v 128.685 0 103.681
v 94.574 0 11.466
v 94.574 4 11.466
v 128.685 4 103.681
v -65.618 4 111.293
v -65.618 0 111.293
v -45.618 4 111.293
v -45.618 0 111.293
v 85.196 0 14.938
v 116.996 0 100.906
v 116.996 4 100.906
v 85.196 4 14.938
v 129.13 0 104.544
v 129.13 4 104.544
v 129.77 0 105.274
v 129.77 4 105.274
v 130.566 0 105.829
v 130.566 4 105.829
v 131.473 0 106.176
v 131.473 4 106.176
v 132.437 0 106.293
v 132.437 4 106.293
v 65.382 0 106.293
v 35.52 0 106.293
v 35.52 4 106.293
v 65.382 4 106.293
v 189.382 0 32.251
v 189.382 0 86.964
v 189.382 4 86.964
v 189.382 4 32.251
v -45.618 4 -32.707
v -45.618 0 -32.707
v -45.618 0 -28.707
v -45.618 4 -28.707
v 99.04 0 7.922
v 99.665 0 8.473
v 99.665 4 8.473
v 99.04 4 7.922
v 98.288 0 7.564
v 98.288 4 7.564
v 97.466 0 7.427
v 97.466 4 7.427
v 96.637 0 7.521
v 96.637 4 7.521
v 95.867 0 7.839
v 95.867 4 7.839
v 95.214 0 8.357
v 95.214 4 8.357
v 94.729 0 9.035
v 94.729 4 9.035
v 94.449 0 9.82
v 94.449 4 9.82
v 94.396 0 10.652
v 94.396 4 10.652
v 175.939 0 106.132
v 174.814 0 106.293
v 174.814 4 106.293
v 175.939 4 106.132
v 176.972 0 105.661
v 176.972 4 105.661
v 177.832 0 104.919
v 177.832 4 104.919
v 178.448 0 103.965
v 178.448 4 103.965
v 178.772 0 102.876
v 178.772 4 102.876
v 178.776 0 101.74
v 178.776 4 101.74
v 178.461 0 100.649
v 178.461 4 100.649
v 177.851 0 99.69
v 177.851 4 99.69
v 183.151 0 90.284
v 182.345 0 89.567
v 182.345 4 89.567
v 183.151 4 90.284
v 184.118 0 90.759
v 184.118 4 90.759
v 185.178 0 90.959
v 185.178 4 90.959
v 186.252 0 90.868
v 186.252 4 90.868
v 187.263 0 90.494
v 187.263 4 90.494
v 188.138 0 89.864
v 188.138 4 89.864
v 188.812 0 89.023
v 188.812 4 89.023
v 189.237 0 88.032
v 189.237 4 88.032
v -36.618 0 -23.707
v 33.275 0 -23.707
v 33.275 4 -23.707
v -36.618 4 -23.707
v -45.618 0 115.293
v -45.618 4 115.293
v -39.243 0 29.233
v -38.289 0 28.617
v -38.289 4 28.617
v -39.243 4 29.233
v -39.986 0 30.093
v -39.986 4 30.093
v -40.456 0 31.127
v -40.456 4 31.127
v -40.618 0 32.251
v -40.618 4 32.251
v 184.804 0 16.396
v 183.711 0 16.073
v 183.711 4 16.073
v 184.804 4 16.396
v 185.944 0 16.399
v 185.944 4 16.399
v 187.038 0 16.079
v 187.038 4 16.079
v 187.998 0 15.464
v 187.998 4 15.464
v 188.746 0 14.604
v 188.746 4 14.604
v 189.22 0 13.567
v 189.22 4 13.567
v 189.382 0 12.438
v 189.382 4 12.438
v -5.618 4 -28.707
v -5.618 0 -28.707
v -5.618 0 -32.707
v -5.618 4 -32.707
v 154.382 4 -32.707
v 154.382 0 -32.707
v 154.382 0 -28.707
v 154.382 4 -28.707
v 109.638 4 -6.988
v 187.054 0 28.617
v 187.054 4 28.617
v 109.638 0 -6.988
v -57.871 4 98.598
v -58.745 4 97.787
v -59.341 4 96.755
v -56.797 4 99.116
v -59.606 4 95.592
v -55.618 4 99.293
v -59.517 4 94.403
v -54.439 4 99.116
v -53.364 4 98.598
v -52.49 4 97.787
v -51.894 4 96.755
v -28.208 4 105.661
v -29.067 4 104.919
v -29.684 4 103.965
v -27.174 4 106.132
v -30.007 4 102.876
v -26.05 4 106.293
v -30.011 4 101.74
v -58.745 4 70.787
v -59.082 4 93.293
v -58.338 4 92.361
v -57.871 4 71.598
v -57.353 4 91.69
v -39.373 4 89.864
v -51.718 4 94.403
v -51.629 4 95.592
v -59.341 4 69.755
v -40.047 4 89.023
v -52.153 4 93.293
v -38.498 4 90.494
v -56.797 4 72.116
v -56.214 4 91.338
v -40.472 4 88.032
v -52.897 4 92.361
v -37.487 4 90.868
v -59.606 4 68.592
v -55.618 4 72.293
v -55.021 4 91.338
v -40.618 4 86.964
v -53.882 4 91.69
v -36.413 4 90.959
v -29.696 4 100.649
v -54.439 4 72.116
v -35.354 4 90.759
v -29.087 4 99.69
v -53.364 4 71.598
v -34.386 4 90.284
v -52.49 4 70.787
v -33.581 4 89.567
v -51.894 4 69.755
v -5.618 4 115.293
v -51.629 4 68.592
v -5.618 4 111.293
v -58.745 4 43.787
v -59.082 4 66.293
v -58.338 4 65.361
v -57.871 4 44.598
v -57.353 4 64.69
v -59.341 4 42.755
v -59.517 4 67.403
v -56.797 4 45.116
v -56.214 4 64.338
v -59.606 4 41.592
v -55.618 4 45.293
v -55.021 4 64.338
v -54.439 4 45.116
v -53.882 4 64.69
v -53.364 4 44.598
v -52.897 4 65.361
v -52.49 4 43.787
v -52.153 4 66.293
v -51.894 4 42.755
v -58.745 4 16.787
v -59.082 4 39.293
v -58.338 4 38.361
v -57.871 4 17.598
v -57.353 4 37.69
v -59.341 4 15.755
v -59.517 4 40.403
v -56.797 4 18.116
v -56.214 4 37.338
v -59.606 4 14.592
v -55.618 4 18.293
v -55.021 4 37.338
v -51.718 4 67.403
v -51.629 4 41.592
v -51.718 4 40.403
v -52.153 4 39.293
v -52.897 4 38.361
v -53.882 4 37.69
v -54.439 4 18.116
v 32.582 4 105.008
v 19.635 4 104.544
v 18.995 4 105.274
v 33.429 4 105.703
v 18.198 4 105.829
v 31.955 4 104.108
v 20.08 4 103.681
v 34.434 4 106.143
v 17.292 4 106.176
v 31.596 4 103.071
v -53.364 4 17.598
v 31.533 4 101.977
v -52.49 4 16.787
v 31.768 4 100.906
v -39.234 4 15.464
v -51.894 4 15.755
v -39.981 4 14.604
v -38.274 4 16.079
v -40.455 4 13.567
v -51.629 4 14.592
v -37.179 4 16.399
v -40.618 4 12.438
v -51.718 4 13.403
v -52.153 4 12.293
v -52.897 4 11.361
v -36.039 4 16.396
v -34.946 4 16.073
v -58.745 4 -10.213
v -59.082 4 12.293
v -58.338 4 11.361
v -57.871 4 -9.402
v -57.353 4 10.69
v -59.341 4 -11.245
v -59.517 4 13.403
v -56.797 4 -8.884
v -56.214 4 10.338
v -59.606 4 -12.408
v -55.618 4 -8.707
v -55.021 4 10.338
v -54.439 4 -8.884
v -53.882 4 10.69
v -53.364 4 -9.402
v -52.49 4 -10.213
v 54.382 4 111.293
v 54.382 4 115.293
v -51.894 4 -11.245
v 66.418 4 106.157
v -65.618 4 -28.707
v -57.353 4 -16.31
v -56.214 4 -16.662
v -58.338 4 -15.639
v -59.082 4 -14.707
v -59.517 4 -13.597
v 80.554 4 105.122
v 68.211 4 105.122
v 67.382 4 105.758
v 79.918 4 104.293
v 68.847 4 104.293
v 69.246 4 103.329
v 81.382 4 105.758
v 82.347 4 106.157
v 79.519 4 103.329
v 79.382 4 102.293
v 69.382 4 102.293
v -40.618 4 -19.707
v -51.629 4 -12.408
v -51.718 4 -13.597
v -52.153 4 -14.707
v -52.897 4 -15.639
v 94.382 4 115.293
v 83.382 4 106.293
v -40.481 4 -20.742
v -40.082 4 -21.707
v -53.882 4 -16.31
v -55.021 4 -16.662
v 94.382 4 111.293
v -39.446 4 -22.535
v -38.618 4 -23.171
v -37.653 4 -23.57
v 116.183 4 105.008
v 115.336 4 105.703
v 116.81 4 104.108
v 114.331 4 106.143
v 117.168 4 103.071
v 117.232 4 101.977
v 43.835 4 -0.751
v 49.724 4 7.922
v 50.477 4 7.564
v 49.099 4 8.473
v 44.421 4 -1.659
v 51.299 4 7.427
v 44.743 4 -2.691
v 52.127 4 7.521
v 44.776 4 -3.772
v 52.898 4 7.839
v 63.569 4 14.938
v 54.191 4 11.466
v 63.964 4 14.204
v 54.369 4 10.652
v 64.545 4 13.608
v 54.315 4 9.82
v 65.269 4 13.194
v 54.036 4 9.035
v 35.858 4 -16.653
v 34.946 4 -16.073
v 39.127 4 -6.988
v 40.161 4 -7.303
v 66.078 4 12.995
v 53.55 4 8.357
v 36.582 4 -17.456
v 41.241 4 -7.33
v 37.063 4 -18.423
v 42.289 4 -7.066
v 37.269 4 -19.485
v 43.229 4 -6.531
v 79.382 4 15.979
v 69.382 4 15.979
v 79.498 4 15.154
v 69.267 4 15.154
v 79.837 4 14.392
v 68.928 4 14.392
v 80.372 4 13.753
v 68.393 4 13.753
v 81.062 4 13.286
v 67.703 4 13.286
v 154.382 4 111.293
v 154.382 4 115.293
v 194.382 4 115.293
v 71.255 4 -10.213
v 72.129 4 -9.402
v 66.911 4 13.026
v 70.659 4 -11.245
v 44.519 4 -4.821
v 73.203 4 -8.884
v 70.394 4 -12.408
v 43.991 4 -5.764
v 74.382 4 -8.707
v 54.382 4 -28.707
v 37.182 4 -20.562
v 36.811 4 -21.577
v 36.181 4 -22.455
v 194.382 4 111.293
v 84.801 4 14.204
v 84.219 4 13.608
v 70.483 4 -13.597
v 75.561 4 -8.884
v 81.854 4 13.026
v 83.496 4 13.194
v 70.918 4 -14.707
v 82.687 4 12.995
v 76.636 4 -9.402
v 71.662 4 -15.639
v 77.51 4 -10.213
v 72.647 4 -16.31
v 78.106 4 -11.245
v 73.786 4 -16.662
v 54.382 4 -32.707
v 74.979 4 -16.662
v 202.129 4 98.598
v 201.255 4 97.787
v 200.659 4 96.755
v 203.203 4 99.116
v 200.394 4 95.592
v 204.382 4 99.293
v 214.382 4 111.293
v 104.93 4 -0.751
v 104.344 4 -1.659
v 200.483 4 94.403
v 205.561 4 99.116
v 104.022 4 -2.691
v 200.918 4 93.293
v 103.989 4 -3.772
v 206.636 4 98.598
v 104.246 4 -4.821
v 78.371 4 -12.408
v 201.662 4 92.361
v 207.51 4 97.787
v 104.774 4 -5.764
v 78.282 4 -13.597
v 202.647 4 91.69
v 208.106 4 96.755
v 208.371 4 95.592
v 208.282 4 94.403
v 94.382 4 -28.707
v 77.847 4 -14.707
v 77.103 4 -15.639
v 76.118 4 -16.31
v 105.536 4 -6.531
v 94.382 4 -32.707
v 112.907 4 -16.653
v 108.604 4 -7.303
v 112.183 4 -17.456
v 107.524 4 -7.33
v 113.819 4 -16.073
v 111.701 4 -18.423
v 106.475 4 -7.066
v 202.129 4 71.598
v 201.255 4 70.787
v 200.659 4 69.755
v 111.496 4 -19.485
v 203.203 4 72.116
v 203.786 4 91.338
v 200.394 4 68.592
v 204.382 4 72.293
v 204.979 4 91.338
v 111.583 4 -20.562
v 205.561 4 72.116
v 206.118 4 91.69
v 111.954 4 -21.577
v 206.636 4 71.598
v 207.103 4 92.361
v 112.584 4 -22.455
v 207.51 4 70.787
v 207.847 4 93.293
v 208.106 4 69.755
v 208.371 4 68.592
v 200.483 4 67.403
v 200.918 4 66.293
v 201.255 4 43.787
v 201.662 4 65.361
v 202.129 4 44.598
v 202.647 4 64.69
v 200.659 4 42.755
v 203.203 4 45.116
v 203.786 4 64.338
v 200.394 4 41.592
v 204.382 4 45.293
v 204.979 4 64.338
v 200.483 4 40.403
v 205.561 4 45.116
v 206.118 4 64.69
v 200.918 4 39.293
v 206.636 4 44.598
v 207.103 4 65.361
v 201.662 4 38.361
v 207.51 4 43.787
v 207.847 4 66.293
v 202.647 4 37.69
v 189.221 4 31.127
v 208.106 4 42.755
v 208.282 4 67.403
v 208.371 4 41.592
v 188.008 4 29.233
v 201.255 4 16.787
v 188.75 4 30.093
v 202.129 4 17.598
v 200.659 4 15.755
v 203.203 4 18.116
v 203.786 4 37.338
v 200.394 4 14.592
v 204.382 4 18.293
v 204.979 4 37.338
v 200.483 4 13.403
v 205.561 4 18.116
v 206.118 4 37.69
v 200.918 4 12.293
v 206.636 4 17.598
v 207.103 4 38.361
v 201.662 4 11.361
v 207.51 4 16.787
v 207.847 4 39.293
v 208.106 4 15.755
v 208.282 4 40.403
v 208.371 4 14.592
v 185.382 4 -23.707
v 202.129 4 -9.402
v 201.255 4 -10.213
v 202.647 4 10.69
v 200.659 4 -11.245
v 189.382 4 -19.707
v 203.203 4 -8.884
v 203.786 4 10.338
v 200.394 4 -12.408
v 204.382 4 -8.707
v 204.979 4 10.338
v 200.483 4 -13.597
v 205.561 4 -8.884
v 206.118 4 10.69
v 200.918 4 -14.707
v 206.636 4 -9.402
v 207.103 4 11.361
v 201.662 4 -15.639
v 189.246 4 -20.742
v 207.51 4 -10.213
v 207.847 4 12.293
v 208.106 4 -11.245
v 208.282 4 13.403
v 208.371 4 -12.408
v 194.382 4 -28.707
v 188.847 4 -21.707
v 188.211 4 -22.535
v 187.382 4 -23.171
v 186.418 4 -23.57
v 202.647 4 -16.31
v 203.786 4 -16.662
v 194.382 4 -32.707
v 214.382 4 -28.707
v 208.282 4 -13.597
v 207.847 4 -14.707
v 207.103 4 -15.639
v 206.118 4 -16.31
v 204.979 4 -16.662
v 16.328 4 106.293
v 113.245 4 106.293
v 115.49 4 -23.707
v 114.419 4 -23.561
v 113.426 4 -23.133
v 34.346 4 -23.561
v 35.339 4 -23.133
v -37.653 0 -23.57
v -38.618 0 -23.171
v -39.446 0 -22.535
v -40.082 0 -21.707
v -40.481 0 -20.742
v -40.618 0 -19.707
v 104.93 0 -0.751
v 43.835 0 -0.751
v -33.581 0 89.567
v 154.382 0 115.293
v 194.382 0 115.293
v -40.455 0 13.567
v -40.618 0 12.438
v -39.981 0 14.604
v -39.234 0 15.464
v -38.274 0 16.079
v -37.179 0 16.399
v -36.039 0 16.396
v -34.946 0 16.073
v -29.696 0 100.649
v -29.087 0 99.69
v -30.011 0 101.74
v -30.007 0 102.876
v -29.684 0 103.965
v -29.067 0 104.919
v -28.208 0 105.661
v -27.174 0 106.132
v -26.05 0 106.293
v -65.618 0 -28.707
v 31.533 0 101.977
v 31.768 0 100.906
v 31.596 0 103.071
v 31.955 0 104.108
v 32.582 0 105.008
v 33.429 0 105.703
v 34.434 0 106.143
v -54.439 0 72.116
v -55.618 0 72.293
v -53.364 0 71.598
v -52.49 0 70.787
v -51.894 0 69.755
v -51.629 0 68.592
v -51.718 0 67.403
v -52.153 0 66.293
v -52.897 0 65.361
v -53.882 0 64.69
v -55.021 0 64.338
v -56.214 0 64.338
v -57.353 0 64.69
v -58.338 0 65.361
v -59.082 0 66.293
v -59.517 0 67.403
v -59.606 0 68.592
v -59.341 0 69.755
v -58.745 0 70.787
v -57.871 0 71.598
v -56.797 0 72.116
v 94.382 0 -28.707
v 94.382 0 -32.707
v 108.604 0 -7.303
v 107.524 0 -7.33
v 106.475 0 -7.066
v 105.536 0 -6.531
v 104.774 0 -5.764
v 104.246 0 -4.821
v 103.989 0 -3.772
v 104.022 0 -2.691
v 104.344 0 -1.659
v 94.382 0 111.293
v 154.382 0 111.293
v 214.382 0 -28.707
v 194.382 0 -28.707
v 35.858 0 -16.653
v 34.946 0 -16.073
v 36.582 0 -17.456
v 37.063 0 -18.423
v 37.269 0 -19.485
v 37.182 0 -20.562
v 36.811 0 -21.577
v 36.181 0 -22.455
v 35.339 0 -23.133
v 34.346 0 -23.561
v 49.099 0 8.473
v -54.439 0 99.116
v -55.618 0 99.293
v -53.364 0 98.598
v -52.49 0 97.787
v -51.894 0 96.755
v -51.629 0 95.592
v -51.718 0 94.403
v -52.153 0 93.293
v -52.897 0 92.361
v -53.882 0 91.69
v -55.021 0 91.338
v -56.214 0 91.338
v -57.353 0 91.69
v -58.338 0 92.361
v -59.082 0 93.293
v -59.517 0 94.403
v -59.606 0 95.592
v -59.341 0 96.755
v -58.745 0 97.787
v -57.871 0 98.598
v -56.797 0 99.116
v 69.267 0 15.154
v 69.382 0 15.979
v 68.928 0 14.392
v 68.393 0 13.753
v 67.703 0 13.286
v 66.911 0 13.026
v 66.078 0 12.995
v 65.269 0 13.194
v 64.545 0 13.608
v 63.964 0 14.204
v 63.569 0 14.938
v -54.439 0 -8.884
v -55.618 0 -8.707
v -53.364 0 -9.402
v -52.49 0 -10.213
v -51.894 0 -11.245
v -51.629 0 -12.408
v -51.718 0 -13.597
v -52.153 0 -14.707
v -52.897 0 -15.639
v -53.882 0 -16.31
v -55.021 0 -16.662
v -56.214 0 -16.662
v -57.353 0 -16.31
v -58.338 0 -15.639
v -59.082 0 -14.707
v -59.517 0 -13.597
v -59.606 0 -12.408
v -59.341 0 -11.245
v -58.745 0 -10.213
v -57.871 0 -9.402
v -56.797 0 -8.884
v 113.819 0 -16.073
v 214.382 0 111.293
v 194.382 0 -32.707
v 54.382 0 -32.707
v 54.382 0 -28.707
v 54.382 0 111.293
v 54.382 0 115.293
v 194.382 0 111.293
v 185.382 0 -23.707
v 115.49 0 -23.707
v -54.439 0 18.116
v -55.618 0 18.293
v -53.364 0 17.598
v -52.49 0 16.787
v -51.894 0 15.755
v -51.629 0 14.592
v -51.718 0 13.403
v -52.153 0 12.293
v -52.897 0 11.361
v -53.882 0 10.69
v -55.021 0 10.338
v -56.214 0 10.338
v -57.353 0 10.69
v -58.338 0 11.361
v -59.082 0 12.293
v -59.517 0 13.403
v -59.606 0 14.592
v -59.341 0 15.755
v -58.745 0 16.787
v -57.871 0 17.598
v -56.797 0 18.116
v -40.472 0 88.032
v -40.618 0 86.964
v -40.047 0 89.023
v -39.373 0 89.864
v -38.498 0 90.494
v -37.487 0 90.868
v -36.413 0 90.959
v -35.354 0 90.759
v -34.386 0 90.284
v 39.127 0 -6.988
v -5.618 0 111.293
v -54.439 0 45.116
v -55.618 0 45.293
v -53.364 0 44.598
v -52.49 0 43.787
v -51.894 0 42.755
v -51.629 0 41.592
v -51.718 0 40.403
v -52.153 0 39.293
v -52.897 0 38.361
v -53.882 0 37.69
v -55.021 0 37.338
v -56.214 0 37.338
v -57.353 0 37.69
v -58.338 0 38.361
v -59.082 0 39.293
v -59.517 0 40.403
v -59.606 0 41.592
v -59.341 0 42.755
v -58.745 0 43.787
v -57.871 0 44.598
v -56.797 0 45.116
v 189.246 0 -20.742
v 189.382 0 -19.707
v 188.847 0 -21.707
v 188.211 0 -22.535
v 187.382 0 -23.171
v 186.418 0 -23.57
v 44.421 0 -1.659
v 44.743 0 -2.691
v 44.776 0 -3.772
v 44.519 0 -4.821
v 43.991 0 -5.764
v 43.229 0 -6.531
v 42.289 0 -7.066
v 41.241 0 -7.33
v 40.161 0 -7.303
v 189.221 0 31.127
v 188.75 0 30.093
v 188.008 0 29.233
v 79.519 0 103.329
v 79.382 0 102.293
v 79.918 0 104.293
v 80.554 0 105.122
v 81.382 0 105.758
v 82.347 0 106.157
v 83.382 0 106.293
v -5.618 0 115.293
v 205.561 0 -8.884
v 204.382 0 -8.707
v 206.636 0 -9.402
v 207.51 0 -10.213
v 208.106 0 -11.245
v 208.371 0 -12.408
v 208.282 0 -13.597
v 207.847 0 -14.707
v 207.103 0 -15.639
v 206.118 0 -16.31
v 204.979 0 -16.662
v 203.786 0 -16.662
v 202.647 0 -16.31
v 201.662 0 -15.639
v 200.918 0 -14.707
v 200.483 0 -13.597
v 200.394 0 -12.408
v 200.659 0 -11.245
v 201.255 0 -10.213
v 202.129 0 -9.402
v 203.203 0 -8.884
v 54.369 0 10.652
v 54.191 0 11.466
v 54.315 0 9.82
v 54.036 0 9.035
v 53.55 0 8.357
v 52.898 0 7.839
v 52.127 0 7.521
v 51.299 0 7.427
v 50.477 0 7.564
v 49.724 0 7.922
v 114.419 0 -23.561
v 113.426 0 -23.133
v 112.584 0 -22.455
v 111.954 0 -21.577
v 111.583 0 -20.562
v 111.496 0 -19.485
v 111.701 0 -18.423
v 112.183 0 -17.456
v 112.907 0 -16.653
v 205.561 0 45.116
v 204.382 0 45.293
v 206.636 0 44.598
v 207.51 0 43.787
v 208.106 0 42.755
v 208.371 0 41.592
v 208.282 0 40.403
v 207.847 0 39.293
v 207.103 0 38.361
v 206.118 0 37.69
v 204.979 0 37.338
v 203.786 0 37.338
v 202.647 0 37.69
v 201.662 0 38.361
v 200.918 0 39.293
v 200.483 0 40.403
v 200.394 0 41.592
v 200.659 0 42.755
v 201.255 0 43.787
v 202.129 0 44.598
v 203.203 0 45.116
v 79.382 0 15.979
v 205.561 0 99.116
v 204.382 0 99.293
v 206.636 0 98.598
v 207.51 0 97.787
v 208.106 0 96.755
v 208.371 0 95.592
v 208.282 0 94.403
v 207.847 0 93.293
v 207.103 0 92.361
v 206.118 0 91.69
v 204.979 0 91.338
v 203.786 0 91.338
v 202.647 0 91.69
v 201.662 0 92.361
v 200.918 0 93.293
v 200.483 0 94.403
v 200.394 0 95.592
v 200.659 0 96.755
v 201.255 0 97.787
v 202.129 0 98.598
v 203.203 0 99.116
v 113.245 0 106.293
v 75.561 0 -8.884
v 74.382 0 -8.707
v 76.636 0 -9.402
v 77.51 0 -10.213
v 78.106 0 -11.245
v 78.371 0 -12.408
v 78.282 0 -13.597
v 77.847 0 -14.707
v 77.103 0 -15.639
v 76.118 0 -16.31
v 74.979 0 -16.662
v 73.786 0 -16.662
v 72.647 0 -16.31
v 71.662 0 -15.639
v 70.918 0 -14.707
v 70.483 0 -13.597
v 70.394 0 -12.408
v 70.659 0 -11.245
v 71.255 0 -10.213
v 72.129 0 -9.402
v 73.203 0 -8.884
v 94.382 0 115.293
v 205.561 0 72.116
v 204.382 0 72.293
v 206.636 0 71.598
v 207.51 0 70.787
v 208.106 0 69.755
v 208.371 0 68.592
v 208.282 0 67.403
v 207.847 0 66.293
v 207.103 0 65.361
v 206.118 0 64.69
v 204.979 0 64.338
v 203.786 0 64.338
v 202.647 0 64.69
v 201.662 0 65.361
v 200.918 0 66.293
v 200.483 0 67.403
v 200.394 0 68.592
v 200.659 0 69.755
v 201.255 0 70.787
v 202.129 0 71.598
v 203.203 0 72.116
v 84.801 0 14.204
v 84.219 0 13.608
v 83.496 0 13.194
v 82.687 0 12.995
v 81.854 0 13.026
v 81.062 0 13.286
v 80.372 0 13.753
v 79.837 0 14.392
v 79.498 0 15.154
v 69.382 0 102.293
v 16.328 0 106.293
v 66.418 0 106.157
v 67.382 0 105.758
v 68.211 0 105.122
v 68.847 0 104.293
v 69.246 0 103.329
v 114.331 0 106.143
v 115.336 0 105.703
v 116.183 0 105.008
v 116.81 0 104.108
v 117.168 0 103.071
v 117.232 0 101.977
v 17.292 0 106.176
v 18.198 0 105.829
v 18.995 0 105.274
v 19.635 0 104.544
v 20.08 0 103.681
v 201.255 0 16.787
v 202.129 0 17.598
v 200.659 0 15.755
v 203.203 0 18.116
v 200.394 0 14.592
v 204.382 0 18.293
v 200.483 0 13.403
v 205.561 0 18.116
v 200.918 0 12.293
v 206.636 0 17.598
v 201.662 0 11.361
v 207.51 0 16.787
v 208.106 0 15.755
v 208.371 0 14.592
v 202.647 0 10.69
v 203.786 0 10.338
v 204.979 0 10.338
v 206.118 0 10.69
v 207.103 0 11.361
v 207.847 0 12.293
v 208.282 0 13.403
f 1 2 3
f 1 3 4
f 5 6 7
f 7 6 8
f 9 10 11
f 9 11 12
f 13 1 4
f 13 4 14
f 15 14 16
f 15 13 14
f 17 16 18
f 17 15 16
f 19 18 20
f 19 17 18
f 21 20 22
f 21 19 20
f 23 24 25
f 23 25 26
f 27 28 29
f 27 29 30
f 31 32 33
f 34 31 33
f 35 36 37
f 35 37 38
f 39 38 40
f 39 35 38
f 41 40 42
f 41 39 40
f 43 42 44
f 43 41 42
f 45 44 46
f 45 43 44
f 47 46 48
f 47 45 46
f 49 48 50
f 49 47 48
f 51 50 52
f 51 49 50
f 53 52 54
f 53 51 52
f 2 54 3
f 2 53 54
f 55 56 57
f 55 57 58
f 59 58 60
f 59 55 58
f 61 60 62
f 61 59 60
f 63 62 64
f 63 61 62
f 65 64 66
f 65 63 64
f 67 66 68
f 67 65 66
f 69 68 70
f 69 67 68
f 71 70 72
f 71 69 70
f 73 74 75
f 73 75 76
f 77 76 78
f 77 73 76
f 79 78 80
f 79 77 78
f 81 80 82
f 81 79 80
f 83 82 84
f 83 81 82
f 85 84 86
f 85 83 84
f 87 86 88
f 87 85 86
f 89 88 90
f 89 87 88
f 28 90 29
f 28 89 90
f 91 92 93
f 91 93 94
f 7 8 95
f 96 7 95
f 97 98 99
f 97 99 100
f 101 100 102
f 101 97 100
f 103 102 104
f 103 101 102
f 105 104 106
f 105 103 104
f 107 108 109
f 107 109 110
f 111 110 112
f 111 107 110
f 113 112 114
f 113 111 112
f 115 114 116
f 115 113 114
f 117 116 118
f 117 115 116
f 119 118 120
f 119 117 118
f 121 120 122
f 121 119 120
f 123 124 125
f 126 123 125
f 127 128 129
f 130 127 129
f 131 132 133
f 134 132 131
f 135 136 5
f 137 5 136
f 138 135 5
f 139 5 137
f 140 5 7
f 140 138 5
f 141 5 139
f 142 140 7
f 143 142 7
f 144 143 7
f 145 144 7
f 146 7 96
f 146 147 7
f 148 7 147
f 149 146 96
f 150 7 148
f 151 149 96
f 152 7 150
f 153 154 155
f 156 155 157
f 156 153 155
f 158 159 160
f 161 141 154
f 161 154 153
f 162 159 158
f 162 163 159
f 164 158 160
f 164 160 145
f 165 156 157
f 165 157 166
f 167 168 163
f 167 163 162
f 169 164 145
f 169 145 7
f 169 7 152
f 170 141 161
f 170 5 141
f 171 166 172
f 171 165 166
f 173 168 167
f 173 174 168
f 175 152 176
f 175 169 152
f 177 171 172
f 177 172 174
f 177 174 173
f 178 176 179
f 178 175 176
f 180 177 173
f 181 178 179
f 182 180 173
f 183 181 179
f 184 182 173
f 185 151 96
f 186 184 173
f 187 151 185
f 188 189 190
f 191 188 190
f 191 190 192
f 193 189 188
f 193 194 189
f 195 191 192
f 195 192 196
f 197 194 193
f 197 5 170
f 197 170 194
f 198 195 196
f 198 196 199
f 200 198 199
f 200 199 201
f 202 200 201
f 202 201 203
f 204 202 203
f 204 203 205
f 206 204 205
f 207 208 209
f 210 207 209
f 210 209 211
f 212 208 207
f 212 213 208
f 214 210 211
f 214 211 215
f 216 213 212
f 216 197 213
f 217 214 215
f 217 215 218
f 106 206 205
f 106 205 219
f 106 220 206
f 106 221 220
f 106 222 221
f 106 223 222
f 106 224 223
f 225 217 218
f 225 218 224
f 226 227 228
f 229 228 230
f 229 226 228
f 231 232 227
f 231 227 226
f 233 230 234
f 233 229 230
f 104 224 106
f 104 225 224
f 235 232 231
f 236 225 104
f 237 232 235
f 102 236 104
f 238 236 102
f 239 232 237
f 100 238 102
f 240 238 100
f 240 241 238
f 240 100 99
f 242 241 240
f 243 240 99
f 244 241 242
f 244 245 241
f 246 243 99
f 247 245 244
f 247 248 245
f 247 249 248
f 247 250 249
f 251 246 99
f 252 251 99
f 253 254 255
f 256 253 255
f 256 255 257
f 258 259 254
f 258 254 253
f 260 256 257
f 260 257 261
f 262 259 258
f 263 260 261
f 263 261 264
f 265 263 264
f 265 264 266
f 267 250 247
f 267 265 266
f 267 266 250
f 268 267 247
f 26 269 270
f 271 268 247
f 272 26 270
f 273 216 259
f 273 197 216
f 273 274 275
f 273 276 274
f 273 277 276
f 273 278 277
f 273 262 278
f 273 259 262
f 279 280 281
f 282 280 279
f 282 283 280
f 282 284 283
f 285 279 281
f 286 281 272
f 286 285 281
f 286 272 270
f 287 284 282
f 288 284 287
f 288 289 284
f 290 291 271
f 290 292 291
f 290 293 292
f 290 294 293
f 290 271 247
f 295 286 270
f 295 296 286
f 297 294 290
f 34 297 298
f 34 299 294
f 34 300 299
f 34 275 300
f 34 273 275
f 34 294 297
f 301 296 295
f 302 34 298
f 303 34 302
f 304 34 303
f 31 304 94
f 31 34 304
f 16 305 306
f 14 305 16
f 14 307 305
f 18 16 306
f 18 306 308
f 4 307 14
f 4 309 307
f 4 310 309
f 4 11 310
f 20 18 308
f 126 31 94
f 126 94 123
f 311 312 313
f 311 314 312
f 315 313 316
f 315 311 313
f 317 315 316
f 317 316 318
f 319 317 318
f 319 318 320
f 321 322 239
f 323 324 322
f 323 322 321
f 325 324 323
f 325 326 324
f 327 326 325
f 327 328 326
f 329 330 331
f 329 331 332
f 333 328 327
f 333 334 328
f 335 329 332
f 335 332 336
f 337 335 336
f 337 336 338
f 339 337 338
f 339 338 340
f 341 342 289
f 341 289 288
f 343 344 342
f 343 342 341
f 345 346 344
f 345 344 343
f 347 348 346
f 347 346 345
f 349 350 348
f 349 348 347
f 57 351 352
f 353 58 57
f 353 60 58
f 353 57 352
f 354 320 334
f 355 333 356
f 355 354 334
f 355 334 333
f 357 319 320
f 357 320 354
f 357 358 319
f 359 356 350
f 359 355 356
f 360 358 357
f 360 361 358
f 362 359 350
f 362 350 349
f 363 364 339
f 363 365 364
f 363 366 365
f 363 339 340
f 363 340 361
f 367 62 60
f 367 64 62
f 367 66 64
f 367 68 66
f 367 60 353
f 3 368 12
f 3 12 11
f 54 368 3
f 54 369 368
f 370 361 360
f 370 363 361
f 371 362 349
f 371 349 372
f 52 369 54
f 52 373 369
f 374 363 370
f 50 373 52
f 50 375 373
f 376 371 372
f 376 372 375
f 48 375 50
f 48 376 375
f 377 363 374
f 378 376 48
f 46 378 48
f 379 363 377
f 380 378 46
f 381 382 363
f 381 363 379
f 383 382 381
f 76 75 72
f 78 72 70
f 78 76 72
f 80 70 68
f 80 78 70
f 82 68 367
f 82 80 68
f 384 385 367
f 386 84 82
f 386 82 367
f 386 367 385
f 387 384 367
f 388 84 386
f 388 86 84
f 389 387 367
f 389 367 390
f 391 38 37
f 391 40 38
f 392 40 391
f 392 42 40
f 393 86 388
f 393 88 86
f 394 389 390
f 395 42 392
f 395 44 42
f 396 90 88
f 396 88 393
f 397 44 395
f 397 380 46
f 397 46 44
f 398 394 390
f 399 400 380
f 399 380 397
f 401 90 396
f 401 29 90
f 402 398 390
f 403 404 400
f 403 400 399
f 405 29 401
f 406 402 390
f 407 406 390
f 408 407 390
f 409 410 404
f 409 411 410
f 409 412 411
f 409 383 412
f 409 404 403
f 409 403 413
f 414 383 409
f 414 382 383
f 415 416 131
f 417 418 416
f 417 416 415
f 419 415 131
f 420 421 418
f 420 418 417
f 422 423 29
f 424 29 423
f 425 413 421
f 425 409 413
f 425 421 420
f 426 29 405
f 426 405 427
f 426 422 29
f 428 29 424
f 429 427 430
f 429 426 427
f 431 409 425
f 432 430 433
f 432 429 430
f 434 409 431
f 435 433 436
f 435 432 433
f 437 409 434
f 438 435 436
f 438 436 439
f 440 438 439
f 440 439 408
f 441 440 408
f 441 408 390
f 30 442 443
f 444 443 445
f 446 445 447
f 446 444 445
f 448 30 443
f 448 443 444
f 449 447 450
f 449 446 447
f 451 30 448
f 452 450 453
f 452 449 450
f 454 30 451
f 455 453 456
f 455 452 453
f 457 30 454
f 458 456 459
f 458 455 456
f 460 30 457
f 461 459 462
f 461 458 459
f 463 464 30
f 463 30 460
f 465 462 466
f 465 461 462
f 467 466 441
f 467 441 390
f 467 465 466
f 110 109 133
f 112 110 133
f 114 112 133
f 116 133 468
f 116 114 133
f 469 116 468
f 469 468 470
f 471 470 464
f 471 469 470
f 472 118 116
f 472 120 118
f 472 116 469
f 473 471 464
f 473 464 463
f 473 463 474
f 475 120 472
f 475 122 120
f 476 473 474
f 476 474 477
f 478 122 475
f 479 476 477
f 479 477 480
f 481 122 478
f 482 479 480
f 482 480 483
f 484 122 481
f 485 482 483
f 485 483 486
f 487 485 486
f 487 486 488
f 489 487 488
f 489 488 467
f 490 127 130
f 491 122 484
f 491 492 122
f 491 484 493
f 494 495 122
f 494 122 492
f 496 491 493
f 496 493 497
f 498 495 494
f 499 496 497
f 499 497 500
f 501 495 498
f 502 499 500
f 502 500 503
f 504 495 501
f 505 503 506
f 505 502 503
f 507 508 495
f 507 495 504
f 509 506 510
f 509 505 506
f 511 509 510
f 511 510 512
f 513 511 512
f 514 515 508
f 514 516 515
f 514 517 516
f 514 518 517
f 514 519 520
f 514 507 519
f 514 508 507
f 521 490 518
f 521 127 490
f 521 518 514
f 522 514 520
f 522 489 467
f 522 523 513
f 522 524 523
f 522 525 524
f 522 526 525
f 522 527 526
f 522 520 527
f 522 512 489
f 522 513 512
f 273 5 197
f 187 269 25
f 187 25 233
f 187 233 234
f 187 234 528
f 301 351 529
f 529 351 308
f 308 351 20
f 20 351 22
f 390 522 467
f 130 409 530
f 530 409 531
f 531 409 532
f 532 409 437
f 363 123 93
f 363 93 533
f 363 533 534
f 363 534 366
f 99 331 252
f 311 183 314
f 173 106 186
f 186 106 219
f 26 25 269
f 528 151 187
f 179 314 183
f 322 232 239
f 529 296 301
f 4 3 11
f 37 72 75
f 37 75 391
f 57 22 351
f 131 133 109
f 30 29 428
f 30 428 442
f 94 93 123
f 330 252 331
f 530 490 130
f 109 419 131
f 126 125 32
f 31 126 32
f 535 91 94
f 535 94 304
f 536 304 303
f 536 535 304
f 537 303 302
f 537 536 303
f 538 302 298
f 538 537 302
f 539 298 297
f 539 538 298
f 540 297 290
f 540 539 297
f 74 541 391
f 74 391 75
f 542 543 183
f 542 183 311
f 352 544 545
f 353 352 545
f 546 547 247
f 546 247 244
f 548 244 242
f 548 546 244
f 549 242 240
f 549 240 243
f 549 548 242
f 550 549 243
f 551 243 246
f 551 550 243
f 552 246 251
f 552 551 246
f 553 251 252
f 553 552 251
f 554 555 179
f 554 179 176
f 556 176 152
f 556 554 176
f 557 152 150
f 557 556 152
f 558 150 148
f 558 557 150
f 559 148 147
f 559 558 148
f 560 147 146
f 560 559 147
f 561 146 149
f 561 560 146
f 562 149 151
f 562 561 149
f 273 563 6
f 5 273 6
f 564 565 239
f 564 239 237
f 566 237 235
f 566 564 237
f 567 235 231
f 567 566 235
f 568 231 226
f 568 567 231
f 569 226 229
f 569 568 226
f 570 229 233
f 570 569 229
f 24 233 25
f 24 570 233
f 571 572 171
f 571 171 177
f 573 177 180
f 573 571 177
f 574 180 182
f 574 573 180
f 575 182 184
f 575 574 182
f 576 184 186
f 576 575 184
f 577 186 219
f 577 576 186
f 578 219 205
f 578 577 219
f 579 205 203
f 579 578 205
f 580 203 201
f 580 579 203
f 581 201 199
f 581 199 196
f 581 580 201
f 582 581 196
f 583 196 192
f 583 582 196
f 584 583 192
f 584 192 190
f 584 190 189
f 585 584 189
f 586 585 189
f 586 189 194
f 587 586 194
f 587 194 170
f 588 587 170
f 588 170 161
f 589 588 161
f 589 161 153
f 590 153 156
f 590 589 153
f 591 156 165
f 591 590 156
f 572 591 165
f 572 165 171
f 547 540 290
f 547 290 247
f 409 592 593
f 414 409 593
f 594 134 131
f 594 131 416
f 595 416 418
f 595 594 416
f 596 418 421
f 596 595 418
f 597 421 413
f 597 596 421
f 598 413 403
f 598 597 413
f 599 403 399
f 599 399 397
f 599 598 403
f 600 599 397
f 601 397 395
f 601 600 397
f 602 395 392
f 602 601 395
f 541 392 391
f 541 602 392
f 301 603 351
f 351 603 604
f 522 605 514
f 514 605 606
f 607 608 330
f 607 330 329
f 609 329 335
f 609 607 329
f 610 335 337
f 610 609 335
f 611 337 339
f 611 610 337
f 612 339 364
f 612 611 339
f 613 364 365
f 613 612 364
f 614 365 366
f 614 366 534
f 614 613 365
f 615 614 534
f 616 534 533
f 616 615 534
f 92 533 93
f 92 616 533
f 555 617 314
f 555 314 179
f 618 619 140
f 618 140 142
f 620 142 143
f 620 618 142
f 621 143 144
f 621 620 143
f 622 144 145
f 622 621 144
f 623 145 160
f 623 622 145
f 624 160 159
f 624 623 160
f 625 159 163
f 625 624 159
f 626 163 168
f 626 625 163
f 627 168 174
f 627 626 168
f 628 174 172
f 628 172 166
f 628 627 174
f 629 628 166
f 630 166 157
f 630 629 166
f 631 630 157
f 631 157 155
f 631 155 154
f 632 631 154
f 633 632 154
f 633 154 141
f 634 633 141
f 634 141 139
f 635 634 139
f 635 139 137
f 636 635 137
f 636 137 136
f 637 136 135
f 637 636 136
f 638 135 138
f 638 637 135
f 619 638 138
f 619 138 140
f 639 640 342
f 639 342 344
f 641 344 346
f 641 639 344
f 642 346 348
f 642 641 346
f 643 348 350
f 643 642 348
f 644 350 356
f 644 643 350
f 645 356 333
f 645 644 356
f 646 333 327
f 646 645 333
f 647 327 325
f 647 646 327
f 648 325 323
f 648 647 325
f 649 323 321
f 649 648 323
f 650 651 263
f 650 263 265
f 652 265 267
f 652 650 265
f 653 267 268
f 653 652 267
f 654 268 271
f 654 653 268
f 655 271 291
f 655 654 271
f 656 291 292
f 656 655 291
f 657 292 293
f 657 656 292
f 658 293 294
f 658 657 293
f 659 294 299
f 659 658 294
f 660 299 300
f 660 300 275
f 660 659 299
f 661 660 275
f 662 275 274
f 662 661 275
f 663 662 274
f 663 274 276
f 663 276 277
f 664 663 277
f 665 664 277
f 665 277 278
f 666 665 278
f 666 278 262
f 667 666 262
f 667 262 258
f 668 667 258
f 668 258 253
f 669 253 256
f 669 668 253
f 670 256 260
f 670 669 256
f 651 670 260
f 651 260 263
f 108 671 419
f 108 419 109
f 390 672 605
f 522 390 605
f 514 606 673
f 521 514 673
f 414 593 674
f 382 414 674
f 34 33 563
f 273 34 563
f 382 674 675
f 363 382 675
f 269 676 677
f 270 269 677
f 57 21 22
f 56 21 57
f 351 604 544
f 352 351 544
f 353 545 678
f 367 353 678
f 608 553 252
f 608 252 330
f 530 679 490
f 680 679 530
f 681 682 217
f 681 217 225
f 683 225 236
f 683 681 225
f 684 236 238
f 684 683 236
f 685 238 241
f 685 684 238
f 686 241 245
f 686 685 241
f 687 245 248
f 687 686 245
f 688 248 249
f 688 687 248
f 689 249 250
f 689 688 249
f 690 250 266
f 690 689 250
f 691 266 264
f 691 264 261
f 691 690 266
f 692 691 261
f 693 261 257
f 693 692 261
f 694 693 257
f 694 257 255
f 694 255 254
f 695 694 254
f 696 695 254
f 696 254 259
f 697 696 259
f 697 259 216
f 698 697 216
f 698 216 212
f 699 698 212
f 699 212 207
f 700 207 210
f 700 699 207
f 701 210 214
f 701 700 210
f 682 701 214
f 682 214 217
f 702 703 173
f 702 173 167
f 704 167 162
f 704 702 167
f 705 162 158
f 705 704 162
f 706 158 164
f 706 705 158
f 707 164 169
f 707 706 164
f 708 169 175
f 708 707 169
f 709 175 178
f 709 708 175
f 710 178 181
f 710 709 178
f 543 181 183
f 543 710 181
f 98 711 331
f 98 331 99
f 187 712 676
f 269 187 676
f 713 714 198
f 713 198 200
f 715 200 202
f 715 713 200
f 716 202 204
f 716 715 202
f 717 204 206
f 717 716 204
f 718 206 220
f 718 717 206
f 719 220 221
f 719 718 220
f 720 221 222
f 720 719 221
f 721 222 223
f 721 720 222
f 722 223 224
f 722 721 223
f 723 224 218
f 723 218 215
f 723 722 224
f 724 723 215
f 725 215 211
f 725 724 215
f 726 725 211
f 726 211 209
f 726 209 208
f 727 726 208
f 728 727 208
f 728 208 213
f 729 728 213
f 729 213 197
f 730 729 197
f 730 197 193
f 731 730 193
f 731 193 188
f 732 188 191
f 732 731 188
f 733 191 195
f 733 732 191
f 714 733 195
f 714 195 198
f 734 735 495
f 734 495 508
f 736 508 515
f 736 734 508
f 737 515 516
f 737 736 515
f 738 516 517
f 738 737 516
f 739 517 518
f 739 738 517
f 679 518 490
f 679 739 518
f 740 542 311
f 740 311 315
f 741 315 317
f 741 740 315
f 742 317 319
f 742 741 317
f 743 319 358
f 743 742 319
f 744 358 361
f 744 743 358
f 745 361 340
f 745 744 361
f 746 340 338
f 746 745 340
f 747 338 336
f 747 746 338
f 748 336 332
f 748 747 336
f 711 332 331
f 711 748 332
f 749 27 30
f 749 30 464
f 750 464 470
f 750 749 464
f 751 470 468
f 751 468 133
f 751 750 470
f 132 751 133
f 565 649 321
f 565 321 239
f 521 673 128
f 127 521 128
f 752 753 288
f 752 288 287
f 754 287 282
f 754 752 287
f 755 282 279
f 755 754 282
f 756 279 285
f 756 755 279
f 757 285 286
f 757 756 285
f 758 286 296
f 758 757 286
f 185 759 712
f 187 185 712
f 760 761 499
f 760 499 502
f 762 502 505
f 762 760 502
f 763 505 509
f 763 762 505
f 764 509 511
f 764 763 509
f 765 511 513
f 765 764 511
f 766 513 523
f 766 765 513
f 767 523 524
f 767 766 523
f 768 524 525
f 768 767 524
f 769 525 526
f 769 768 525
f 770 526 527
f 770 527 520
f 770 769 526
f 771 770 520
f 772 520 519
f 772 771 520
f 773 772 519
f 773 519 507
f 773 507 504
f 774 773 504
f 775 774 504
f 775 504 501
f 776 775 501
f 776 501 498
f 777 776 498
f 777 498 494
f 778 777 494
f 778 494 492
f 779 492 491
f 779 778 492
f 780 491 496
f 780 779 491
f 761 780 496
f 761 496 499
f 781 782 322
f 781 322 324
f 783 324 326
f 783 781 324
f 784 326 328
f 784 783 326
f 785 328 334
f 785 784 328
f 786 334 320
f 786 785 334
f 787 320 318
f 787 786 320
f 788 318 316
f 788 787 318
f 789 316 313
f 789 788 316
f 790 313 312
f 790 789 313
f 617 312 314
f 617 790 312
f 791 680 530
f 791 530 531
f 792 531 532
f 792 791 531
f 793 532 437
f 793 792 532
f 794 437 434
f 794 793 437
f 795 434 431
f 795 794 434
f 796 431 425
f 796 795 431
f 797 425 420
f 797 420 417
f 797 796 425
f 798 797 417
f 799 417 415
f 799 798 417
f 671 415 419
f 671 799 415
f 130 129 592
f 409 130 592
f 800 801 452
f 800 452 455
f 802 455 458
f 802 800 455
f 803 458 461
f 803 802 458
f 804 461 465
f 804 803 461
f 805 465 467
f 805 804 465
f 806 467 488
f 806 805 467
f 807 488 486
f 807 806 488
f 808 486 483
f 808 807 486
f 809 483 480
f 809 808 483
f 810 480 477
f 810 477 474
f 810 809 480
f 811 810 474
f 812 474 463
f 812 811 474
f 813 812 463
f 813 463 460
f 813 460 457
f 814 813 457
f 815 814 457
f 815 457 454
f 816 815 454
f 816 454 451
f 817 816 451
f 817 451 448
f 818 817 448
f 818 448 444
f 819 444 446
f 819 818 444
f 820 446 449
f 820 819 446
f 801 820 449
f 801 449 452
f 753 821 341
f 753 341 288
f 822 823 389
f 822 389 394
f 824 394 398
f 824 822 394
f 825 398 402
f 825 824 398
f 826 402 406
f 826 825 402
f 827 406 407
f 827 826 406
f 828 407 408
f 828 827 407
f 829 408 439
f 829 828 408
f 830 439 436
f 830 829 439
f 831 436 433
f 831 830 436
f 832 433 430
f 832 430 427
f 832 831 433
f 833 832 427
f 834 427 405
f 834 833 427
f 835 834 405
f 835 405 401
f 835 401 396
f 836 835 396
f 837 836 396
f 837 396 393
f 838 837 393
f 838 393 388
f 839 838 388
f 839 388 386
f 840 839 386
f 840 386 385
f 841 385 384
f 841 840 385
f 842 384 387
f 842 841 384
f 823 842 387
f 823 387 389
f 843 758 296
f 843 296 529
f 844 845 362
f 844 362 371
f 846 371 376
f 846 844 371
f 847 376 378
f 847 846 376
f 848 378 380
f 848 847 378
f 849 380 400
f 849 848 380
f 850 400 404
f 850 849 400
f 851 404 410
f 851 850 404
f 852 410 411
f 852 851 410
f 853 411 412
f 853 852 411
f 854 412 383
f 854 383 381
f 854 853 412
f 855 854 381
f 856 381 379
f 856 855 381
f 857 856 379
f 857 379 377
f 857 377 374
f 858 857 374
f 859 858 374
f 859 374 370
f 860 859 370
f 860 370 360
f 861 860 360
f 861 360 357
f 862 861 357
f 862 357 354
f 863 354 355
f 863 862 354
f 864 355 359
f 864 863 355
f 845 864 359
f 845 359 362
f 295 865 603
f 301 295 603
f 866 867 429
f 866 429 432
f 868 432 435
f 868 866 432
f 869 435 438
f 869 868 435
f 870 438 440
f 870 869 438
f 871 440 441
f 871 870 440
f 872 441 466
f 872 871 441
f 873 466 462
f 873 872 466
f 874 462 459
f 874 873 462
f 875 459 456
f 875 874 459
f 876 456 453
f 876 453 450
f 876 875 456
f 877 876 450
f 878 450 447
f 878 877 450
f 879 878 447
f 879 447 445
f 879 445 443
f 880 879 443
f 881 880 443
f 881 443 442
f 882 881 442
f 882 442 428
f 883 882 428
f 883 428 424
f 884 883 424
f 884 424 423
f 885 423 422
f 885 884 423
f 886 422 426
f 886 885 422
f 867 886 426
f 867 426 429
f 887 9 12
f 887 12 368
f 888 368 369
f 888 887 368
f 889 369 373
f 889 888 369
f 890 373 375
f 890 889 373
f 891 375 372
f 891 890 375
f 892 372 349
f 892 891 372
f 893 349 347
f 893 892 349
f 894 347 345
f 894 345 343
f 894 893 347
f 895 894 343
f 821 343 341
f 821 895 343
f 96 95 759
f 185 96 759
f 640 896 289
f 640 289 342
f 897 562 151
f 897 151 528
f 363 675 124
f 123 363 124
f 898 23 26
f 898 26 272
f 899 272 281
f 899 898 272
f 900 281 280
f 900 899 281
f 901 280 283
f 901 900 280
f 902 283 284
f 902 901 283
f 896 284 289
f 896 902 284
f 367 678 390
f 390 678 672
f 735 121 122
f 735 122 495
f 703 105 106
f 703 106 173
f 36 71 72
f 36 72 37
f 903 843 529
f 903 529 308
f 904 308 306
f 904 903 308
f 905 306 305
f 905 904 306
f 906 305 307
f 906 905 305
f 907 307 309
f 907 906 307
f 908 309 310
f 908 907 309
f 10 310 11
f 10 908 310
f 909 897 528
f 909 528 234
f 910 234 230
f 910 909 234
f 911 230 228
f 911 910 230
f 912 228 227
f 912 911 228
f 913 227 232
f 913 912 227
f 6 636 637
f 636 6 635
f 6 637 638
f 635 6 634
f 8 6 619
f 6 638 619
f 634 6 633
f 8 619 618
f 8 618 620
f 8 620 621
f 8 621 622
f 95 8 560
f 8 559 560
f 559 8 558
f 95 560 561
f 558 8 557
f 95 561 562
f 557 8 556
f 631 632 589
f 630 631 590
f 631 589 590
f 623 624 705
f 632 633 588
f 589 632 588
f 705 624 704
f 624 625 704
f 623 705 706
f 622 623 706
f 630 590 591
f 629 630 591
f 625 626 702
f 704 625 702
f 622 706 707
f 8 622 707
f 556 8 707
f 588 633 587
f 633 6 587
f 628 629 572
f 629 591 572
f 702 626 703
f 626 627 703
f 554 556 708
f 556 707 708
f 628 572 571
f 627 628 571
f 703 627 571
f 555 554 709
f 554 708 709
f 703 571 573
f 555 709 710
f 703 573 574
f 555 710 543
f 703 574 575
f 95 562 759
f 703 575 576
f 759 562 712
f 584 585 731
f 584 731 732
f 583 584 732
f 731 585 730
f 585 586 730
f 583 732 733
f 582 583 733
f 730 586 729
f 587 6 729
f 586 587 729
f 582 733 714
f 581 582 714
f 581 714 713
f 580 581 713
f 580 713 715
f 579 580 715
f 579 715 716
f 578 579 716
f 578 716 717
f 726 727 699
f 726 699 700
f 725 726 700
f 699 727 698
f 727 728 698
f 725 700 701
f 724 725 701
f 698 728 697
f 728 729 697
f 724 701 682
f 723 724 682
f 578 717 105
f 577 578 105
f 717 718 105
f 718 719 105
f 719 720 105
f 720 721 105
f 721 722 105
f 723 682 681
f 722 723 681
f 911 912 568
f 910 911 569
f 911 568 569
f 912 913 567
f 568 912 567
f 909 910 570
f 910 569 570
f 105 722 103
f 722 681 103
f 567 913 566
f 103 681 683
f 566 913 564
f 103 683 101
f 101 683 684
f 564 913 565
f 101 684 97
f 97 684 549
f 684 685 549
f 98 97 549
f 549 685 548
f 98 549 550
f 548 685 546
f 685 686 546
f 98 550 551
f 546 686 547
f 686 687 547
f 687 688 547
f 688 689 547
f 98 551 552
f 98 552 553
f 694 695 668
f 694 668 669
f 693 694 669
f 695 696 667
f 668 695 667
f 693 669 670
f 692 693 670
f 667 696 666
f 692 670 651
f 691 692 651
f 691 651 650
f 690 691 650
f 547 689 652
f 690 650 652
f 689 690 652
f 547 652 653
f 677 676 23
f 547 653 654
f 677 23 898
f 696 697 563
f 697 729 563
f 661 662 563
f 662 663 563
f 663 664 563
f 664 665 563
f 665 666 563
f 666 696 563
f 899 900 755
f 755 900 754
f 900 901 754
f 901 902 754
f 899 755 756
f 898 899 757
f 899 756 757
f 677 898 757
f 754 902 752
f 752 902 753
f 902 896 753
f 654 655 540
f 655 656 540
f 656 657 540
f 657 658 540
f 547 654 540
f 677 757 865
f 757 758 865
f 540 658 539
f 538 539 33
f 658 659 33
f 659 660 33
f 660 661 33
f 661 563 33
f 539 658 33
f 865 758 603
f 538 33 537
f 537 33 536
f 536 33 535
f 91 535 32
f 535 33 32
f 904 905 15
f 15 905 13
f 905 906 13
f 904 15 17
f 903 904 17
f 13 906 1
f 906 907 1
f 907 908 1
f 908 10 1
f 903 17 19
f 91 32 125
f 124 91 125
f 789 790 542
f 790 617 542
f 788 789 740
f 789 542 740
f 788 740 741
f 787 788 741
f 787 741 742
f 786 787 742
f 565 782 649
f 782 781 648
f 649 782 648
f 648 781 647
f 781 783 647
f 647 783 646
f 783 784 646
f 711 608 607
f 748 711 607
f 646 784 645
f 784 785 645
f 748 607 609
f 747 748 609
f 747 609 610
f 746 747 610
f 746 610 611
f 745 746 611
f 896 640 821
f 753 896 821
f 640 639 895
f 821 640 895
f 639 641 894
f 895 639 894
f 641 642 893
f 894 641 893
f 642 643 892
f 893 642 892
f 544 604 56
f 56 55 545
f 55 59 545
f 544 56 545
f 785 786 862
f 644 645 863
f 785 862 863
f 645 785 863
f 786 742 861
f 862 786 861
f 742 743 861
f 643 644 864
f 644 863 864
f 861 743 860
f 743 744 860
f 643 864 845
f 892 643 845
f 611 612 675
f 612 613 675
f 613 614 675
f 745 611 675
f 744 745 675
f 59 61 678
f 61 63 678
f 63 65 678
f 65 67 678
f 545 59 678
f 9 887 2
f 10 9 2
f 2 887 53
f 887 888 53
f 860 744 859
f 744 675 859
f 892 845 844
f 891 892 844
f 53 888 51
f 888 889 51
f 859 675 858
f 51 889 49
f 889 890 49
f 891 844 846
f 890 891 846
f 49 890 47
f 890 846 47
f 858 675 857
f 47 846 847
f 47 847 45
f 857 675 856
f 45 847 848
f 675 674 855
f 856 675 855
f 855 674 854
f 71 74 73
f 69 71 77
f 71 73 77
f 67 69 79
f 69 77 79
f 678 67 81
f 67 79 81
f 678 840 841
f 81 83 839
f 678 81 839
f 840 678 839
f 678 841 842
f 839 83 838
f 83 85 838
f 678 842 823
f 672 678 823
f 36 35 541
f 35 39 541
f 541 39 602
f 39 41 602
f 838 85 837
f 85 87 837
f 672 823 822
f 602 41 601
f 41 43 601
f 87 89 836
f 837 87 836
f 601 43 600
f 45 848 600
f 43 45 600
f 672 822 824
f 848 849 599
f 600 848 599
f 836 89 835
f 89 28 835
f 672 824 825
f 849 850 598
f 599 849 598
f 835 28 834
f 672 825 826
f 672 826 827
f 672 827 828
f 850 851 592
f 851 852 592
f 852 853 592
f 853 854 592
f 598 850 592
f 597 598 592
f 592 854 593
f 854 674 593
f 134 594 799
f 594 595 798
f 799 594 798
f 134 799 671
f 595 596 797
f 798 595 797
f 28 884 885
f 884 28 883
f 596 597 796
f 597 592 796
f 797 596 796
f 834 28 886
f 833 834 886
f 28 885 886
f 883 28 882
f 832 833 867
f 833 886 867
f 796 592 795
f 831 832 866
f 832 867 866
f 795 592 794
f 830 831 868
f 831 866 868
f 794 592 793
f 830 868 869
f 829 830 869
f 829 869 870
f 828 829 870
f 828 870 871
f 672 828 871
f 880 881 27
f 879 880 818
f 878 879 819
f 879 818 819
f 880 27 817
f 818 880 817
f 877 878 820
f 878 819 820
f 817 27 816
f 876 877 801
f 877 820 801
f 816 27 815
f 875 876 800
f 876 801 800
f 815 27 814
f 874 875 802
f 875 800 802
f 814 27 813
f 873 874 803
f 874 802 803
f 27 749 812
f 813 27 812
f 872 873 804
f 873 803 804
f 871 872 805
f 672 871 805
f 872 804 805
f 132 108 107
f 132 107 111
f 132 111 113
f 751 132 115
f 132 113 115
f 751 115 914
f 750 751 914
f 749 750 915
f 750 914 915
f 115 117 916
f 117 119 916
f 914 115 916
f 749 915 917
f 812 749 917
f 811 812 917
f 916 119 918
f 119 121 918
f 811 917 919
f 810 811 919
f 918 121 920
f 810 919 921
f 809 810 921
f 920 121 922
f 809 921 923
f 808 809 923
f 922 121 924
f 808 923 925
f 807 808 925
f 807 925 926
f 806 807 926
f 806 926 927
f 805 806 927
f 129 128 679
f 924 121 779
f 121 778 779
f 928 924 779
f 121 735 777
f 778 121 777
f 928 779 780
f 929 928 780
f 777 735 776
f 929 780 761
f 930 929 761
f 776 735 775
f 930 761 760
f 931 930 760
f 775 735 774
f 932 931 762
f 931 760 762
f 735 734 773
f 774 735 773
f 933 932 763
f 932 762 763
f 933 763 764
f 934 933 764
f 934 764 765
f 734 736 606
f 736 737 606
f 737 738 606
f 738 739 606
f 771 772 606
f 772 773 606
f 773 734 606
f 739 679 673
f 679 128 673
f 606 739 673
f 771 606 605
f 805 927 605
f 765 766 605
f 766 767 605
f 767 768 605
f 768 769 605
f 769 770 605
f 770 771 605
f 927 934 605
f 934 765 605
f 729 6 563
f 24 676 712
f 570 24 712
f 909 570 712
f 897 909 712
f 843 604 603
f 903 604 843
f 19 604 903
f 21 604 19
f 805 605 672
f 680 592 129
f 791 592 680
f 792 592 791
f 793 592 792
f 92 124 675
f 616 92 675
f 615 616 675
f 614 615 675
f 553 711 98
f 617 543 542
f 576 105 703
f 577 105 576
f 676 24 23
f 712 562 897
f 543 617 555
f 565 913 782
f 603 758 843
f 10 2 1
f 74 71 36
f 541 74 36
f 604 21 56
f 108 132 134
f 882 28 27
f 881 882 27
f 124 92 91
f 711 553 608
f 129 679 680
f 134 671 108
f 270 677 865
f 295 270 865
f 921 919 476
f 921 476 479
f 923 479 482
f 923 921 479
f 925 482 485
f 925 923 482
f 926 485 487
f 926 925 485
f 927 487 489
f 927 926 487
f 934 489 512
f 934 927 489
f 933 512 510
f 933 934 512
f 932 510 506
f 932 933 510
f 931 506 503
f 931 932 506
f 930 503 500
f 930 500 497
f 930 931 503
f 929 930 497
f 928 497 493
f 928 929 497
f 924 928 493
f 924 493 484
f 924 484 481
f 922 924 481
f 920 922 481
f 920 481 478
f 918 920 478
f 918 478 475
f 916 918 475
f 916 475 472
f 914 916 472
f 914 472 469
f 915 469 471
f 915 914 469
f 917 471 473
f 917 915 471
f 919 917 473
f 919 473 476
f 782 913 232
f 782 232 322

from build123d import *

# Parameters (mm, degrees)
SKETCH2_R           = 4
BOSS_EXTRUDE1_DEPTH = 4


with BuildPart() as part:
    # Sketch2 → Boss-Extrude1 (new body)
    with BuildSketch(Plane(origin=(0, 0, 0), x_dir=(1, 0, 0), z_dir=(0, 1, 0))):
        Polygon((-65.617598228, 28.706575469), (-65.617598228, -111.293424531), (-45.617598228, -111.293424531), (-45.617598228, -115.293424531), (-5.617598228, -115.293424531), (-5.617598228, -111.293424531), (54.382401772, -111.293424531), (54.382401772, -115.293424531), (94.382401772, -115.293424531), (94.382401772, -111.293424531), (154.382401772, -111.293424531), (154.382401772, -115.293424531), (194.382401772, -115.293424531), (194.382401772, -111.293424531), (214.382401772, -111.293424531), (214.382401772, 28.706575469), (194.382401772, 28.706575469), (194.382401772, 32.706575469), (154.382401772, 32.706575469), (154.382401772, 28.706575469), (94.382401772, 28.706575469), (94.382401772, 32.706575469), (54.382401772, 32.706575469), (54.382401772, 28.706575469), (-5.617598228, 28.706575469), (-5.617598228, 32.706575469), (-45.617598228, 32.706575469), (-45.617598228, 28.706575469), align=None)
        with Locations(Location((-55.617598228, 12.706575469, 0), (0, 0, 270))):
            Circle(SKETCH2_R, mode=Mode.SUBTRACT)
        with Locations(Location((-55.617598228, -14.293424531, 0), (0, 0, 270))):
            Circle(SKETCH2_R, mode=Mode.SUBTRACT)
        with Locations(Location((-55.617598228, -41.293424531, 0), (0, 0, 270))):
            Circle(SKETCH2_R, mode=Mode.SUBTRACT)
        with Locations(Location((-55.617598228, -68.293424531, 0), (0, 0, 270))):
            Circle(SKETCH2_R, mode=Mode.SUBTRACT)
        with Locations(Location((-55.617598228, -95.293424531, 0), (0, 0, 270))):
            Circle(SKETCH2_R, mode=Mode.SUBTRACT)
        with Locations(Location((204.382401772, -95.293424531, 0), (0, 0, 270))):
            Circle(SKETCH2_R, mode=Mode.SUBTRACT)
        with Locations(Location((204.382401772, -68.293424531, 0), (0, 0, 270))):
            Circle(SKETCH2_R, mode=Mode.SUBTRACT)
        with Locations(Location((204.382401772, -41.293424531, 0), (0, 0, 270))):
            Circle(SKETCH2_R, mode=Mode.SUBTRACT)
        with Locations(Location((204.382401772, -14.293424531, 0), (0, 0, 270))):
            Circle(SKETCH2_R, mode=Mode.SUBTRACT)
        with Locations(Location((204.382401772, 12.706575469, 0), (0, 0, 270))):
            Circle(SKETCH2_R, mode=Mode.SUBTRACT)
        with Locations(Location((74.382401772, 12.706575469, 0), (0, 0, 270))):
            Circle(SKETCH2_R, mode=Mode.SUBTRACT)
        with BuildLine():
            Line((39.126697, 6.98825761), (-38.288984409, -28.616858167))
            ThreePointArc((-38.288984409, -28.616858167), (-39.985501487, -30.092867561), (-40.617598228, -32.250928644))
            Line((-40.617598228, -32.250928644), (-40.617598228, -86.964107845))
            ThreePointArc((-40.617598228, -86.964107845), (-38.005383219, -90.715647904), (-33.580571819, -89.567273339))
            Line((-33.580571819, -89.567273339), (43.835109591, 0.751021639))
            ThreePointArc((43.835109591, 0.751021639), (43.990577731, 5.764161935), (39.126697, 6.98825761))
        make_face(mode=Mode.SUBTRACT)
        with BuildLine():
            Line((-40.617598228, 19.706575469), (-40.617598228, -12.438434514))
            ThreePointArc((-40.617598228, -12.438434514), (-38.775659311, -15.806337773), (-34.946212047, -16.072504992))
            Line((-34.946212047, -16.072504992), (34.946212047, 16.072504992))
            ThreePointArc((34.946212047, 16.072504992), (37.182272725, 20.562063076), (33.274825866, 23.706575469))
            Line((33.274825866, 23.706575469), (-36.617598228, 23.706575469))
            ThreePointArc((-36.617598228, 23.706575469), (-39.446025353, 22.535002594), (-40.617598228, 19.706575469))
        make_face(mode=Mode.SUBTRACT)
        with BuildLine():
            Line((-26.049612497, -106.293424531), (16.328011378, -106.293424531))
            ThreePointArc((16.328011378, -106.293424531), (18.613731131, -105.576027951), (20.079567117, -103.681167137))
            Line((20.079567117, -103.681167137), (54.190855271, -11.46637295))
            ThreePointArc((54.190855271, -11.46637295), (52.897576456, -7.839367943), (49.099418661, -8.473191875))
            Line((49.099418661, -8.473191875), (-29.086638907, -99.690259037))
            ThreePointArc((-29.086638907, -99.690259037), (-29.683664091, -103.964851769), (-26.049612497, -106.293424531))
        make_face(mode=Mode.SUBTRACT)
        with BuildLine():
            Line((79.382401772, -15.979265858), (79.382401772, -102.293424531))
            ThreePointArc((79.382401772, -102.293424531), (80.553974647, -105.121851656), (83.382401772, -106.293424531))
            Line((83.382401772, -106.293424531), (113.244754244, -106.293424531))
            ThreePointArc((113.244754244, -106.293424531), (116.527357664, -104.579144283), (116.996309982, -100.905681925))
            Line((116.996309982, -100.905681925), (85.196068576, -14.938458903))
            ThreePointArc((85.196068576, -14.938458903), (81.853724371, -13.026216551), (79.382401772, -15.979265858))
        make_face(mode=Mode.SUBTRACT)
        with BuildLine():
            Line((35.5200493, -106.293424531), (65.382401772, -106.293424531))
            ThreePointArc((65.382401772, -106.293424531), (68.210828897, -105.121851656), (69.382401772, -102.293424531))
            Line((69.382401772, -102.293424531), (69.382401772, -15.979265858))
            ThreePointArc((69.382401772, -15.979265858), (66.911079173, -13.026216551), (63.568734968, -14.938458903))
            Line((63.568734968, -14.938458903), (31.768493562, -100.905681925))
            ThreePointArc((31.768493562, -100.905681925), (32.23744588, -104.579144283), (35.5200493, -106.293424531))
        make_face(mode=Mode.SUBTRACT)
        with BuildLine():
            Line((187.053787953, -28.616858167), (109.638106544, 6.98825761))
            ThreePointArc((109.638106544, 6.98825761), (104.774225813, 5.764161935), (104.929693953, 0.751021639))
            Line((104.929693953, 0.751021639), (182.345375363, -89.567273339))
            ThreePointArc((182.345375363, -89.567273339), (186.770186763, -90.715647904), (189.382401772, -86.964107845))
            Line((189.382401772, -86.964107845), (189.382401772, -32.250928644))
            ThreePointArc((189.382401772, -32.250928644), (188.750305031, -30.092867561), (187.053787953, -28.616858167))
        make_face(mode=Mode.SUBTRACT)
        with BuildLine():
            Line((185.382401772, 23.706575469), (115.489977678, 23.706575469))
            ThreePointArc((115.489977678, 23.706575469), (111.582530819, 20.562063076), (113.818591497, 16.072504992))
            Line((113.818591497, 16.072504992), (183.711015591, -16.072504992))
            ThreePointArc((183.711015591, -16.072504992), (187.540462855, -15.806337773), (189.382401772, -12.438434514))
            Line((189.382401772, -12.438434514), (189.382401772, 19.706575469))
            ThreePointArc((189.382401772, 19.706575469), (188.210828897, 22.535002594), (185.382401772, 23.706575469))
        make_face(mode=Mode.SUBTRACT)
        with BuildLine():
            Line((94.573948273, -11.46637295), (128.685236427, -103.681167137))
            ThreePointArc((128.685236427, -103.681167137), (130.151072413, -105.576027951), (132.436792166, -106.293424531))
            Line((132.436792166, -106.293424531), (174.814416041, -106.293424531))
            ThreePointArc((174.814416041, -106.293424531), (178.448467635, -103.964851769), (177.851442451, -99.690259037))
            Line((177.851442451, -99.690259037), (99.665384883, -8.473191875))
            ThreePointArc((99.665384883, -8.473191875), (95.867227088, -7.839367943), (94.573948273, -11.46637295))
        make_face(mode=Mode.SUBTRACT)
    extrude(amount=BOSS_EXTRUDE1_DEPTH)


solid = part.part
